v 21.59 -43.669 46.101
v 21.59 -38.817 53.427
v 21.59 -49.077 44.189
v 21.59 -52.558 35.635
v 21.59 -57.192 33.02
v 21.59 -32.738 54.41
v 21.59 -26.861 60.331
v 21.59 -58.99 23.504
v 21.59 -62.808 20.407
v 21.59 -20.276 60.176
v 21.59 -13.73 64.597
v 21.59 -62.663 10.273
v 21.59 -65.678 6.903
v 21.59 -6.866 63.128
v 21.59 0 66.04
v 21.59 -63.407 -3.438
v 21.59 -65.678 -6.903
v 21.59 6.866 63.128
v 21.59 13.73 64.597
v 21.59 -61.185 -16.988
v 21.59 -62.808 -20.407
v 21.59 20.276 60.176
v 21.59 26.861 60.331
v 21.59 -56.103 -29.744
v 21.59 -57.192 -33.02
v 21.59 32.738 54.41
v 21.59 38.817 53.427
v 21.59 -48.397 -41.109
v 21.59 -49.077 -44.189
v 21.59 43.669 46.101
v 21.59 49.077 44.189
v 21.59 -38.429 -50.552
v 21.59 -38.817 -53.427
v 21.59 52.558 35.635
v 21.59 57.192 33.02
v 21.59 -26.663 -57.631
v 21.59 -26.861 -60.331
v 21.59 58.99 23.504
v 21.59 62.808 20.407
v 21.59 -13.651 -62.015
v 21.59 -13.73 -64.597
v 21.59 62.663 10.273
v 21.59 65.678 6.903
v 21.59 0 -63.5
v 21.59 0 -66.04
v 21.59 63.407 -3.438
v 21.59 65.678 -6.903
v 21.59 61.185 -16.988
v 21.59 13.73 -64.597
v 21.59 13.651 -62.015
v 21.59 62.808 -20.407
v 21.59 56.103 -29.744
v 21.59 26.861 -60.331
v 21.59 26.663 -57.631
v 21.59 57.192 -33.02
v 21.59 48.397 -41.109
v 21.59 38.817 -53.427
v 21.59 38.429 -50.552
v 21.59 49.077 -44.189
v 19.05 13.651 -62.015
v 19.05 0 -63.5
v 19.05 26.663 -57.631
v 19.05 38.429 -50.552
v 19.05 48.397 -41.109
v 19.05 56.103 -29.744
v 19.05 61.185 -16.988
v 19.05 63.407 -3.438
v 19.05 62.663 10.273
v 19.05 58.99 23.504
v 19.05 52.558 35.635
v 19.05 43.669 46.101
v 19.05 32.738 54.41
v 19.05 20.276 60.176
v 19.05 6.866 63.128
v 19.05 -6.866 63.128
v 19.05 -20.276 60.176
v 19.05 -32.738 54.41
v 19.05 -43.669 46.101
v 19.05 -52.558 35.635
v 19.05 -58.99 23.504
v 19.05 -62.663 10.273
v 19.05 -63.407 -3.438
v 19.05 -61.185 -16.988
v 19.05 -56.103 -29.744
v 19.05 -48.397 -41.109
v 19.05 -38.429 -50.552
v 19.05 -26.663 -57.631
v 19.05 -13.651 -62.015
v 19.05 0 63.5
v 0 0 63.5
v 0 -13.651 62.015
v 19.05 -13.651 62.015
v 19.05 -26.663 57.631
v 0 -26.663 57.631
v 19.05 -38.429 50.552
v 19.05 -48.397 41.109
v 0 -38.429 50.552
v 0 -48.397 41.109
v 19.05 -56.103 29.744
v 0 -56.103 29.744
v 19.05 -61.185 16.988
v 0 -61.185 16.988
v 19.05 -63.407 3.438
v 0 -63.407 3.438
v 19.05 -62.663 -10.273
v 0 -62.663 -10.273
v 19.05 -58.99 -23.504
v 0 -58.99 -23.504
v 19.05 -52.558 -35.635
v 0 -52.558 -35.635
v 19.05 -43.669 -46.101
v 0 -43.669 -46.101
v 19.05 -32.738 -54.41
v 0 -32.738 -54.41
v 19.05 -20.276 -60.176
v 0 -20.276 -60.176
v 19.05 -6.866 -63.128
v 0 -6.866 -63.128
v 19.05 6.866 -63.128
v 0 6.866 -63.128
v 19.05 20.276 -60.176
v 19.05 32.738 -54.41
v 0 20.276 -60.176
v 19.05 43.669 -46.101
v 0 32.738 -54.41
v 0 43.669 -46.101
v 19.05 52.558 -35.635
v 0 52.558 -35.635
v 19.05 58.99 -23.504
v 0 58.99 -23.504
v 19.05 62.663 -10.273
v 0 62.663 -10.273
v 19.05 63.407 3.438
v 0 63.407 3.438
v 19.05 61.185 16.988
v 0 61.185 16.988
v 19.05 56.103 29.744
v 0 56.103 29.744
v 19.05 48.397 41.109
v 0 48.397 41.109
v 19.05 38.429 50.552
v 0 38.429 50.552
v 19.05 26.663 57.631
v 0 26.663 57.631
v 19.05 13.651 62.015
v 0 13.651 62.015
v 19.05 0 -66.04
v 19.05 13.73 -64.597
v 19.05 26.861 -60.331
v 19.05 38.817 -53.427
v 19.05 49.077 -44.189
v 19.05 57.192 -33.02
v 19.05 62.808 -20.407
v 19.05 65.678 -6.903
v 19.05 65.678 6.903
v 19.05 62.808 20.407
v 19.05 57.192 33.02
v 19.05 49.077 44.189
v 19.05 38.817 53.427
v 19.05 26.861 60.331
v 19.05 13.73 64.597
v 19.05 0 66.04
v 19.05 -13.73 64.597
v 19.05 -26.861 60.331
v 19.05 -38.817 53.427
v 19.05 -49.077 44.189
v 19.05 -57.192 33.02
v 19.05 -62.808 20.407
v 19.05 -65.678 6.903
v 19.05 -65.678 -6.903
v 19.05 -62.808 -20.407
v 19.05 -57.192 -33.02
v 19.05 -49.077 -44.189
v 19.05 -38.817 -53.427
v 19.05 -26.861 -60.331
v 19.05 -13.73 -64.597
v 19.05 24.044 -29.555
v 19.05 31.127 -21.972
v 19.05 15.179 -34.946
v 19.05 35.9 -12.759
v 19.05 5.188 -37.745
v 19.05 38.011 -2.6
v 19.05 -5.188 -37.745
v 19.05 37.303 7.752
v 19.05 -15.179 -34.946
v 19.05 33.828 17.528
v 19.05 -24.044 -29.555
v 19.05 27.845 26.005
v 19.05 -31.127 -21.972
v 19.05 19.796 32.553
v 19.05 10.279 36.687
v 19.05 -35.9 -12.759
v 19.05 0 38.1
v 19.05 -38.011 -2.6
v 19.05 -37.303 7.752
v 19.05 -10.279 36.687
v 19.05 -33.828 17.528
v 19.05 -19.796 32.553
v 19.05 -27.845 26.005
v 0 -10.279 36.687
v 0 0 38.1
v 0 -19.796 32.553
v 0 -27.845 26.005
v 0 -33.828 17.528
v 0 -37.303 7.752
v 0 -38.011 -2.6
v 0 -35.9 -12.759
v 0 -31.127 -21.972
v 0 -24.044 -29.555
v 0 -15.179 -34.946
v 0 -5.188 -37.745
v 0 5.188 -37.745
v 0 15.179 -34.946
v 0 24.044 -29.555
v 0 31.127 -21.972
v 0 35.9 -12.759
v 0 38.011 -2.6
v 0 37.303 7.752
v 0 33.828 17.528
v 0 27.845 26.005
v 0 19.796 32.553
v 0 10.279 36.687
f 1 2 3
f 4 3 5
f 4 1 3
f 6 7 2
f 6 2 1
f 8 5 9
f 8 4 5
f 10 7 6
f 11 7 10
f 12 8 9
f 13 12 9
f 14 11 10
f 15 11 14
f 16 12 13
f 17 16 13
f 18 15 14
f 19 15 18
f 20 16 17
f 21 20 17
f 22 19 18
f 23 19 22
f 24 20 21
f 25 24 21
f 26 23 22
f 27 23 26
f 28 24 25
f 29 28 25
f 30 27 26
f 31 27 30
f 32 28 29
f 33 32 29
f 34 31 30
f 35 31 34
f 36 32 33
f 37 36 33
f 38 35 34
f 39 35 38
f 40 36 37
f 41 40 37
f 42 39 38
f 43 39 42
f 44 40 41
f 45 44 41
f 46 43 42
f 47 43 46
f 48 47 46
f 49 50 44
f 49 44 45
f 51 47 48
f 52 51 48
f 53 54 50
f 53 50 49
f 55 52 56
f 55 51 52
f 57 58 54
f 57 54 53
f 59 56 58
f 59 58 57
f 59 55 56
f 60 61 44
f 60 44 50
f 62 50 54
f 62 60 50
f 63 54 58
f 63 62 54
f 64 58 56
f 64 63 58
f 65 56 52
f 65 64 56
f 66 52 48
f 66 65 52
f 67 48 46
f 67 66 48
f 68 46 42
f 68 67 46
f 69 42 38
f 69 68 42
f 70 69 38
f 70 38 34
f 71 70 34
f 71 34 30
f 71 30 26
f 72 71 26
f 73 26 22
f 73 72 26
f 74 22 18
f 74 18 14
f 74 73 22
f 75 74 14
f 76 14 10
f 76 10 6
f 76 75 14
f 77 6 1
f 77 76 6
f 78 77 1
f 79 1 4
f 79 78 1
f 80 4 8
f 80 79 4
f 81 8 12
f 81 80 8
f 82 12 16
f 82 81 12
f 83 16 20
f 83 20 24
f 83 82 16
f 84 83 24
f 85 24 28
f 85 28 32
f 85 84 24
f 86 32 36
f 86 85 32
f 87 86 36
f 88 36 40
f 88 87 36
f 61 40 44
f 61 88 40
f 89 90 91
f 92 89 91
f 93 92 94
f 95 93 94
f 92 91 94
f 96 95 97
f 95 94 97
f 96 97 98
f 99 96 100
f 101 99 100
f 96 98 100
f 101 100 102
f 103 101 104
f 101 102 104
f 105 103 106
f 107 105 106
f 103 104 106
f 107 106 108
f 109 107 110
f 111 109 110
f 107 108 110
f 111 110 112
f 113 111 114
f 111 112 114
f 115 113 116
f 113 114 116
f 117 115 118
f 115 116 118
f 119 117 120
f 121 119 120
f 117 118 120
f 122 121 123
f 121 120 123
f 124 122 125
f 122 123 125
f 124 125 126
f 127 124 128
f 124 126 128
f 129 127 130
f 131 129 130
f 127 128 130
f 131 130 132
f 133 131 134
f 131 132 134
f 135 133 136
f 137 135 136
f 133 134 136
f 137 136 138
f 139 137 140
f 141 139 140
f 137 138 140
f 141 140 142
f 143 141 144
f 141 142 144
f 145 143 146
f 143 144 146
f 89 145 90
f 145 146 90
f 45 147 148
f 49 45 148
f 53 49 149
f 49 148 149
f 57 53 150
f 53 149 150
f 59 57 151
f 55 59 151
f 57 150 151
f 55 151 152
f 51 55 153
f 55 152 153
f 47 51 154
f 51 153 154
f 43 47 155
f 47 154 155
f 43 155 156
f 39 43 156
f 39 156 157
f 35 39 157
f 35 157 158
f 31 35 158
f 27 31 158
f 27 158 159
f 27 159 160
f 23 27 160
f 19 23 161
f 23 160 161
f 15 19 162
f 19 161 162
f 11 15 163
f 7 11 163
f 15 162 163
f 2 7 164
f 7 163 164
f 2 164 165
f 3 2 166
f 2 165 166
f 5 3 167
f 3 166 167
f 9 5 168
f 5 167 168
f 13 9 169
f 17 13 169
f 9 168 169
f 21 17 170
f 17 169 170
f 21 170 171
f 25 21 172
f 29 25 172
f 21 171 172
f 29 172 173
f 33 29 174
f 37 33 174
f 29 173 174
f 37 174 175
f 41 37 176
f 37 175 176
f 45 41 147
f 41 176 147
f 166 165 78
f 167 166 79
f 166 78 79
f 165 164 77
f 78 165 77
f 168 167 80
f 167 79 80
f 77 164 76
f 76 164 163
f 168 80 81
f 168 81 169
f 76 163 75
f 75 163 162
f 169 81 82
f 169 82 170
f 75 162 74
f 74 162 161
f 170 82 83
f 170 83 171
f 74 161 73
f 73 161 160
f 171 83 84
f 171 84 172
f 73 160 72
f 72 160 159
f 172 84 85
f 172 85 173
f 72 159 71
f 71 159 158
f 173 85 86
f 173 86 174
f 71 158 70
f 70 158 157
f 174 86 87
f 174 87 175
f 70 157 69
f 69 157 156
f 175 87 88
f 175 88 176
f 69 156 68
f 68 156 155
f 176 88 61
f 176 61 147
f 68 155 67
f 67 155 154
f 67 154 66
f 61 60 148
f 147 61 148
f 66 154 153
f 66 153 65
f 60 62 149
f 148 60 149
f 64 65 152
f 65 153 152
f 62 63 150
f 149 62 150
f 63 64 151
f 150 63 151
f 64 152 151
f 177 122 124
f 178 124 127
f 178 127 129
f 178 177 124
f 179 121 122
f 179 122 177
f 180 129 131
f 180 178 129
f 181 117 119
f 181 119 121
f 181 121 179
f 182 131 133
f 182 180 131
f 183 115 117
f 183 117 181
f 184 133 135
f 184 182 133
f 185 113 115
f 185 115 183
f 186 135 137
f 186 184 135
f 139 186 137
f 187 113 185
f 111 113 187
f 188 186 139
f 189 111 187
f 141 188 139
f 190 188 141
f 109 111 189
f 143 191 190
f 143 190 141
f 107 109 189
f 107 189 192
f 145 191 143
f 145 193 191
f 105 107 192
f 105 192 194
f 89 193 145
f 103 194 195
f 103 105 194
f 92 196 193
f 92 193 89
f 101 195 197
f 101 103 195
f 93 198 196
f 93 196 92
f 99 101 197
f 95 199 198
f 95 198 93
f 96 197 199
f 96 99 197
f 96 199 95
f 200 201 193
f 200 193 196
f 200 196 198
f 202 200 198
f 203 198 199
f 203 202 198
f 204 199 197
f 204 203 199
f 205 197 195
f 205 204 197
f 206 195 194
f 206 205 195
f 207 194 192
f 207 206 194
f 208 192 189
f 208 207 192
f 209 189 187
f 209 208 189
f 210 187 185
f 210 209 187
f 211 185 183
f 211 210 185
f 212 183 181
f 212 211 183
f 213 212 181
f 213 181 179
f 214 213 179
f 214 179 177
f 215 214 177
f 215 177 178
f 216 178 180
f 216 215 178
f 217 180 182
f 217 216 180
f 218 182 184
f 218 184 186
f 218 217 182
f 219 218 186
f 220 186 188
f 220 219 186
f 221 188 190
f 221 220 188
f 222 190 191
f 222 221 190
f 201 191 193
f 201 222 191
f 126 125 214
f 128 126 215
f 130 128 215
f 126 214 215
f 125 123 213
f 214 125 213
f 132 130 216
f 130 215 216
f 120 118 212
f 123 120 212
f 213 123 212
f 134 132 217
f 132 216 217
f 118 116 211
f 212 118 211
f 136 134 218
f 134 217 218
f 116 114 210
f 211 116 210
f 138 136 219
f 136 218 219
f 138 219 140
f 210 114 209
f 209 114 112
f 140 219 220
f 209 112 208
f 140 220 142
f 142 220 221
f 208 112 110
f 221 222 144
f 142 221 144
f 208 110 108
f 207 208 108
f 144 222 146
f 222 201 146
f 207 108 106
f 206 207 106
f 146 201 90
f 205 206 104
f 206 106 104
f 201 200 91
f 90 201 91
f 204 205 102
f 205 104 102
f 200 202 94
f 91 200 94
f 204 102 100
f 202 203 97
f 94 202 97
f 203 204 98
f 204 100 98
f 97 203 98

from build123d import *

# Parameters (mm, degrees)
SKETCH1_R           = 63.5
SKETCH1_R_2         = 38.1
BOSS_EXTRUDE1_DEPTH = 19.05
SKETCH2_R           = 66.04
SKETCH2_R_2         = 63.5
BOSS_EXTRUDE2_DEPTH = 2.54


with BuildPart() as part:
    # Sketch1 → Boss-Extrude1 (new body)
    with BuildSketch(Plane(origin=(0, 0, 0), x_dir=(0, 0, -1), z_dir=(1, 0, 0))):
        with Locations(Location((0, 0, 0), (0, 0, 180))):
            Circle(SKETCH1_R)
        with Locations(Location((0, 0, 0), (0, 0, 180))):
            Circle(SKETCH1_R_2, mode=Mode.SUBTRACT)
    extrude(amount=BOSS_EXTRUDE1_DEPTH)


with BuildPart() as body_2:
    # Sketch2 → Boss-Extrude2 (new body)
    with BuildSketch(Plane(origin=(19.05, 0, 0), x_dir=(0, 0, -1), z_dir=(1, 0, 0))):
        Circle(SKETCH2_R)
        Circle(SKETCH2_R_2, mode=Mode.SUBTRACT)
    extrude(amount=BOSS_EXTRUDE2_DEPTH)


solid = Compound([part.part, body_2.part])
